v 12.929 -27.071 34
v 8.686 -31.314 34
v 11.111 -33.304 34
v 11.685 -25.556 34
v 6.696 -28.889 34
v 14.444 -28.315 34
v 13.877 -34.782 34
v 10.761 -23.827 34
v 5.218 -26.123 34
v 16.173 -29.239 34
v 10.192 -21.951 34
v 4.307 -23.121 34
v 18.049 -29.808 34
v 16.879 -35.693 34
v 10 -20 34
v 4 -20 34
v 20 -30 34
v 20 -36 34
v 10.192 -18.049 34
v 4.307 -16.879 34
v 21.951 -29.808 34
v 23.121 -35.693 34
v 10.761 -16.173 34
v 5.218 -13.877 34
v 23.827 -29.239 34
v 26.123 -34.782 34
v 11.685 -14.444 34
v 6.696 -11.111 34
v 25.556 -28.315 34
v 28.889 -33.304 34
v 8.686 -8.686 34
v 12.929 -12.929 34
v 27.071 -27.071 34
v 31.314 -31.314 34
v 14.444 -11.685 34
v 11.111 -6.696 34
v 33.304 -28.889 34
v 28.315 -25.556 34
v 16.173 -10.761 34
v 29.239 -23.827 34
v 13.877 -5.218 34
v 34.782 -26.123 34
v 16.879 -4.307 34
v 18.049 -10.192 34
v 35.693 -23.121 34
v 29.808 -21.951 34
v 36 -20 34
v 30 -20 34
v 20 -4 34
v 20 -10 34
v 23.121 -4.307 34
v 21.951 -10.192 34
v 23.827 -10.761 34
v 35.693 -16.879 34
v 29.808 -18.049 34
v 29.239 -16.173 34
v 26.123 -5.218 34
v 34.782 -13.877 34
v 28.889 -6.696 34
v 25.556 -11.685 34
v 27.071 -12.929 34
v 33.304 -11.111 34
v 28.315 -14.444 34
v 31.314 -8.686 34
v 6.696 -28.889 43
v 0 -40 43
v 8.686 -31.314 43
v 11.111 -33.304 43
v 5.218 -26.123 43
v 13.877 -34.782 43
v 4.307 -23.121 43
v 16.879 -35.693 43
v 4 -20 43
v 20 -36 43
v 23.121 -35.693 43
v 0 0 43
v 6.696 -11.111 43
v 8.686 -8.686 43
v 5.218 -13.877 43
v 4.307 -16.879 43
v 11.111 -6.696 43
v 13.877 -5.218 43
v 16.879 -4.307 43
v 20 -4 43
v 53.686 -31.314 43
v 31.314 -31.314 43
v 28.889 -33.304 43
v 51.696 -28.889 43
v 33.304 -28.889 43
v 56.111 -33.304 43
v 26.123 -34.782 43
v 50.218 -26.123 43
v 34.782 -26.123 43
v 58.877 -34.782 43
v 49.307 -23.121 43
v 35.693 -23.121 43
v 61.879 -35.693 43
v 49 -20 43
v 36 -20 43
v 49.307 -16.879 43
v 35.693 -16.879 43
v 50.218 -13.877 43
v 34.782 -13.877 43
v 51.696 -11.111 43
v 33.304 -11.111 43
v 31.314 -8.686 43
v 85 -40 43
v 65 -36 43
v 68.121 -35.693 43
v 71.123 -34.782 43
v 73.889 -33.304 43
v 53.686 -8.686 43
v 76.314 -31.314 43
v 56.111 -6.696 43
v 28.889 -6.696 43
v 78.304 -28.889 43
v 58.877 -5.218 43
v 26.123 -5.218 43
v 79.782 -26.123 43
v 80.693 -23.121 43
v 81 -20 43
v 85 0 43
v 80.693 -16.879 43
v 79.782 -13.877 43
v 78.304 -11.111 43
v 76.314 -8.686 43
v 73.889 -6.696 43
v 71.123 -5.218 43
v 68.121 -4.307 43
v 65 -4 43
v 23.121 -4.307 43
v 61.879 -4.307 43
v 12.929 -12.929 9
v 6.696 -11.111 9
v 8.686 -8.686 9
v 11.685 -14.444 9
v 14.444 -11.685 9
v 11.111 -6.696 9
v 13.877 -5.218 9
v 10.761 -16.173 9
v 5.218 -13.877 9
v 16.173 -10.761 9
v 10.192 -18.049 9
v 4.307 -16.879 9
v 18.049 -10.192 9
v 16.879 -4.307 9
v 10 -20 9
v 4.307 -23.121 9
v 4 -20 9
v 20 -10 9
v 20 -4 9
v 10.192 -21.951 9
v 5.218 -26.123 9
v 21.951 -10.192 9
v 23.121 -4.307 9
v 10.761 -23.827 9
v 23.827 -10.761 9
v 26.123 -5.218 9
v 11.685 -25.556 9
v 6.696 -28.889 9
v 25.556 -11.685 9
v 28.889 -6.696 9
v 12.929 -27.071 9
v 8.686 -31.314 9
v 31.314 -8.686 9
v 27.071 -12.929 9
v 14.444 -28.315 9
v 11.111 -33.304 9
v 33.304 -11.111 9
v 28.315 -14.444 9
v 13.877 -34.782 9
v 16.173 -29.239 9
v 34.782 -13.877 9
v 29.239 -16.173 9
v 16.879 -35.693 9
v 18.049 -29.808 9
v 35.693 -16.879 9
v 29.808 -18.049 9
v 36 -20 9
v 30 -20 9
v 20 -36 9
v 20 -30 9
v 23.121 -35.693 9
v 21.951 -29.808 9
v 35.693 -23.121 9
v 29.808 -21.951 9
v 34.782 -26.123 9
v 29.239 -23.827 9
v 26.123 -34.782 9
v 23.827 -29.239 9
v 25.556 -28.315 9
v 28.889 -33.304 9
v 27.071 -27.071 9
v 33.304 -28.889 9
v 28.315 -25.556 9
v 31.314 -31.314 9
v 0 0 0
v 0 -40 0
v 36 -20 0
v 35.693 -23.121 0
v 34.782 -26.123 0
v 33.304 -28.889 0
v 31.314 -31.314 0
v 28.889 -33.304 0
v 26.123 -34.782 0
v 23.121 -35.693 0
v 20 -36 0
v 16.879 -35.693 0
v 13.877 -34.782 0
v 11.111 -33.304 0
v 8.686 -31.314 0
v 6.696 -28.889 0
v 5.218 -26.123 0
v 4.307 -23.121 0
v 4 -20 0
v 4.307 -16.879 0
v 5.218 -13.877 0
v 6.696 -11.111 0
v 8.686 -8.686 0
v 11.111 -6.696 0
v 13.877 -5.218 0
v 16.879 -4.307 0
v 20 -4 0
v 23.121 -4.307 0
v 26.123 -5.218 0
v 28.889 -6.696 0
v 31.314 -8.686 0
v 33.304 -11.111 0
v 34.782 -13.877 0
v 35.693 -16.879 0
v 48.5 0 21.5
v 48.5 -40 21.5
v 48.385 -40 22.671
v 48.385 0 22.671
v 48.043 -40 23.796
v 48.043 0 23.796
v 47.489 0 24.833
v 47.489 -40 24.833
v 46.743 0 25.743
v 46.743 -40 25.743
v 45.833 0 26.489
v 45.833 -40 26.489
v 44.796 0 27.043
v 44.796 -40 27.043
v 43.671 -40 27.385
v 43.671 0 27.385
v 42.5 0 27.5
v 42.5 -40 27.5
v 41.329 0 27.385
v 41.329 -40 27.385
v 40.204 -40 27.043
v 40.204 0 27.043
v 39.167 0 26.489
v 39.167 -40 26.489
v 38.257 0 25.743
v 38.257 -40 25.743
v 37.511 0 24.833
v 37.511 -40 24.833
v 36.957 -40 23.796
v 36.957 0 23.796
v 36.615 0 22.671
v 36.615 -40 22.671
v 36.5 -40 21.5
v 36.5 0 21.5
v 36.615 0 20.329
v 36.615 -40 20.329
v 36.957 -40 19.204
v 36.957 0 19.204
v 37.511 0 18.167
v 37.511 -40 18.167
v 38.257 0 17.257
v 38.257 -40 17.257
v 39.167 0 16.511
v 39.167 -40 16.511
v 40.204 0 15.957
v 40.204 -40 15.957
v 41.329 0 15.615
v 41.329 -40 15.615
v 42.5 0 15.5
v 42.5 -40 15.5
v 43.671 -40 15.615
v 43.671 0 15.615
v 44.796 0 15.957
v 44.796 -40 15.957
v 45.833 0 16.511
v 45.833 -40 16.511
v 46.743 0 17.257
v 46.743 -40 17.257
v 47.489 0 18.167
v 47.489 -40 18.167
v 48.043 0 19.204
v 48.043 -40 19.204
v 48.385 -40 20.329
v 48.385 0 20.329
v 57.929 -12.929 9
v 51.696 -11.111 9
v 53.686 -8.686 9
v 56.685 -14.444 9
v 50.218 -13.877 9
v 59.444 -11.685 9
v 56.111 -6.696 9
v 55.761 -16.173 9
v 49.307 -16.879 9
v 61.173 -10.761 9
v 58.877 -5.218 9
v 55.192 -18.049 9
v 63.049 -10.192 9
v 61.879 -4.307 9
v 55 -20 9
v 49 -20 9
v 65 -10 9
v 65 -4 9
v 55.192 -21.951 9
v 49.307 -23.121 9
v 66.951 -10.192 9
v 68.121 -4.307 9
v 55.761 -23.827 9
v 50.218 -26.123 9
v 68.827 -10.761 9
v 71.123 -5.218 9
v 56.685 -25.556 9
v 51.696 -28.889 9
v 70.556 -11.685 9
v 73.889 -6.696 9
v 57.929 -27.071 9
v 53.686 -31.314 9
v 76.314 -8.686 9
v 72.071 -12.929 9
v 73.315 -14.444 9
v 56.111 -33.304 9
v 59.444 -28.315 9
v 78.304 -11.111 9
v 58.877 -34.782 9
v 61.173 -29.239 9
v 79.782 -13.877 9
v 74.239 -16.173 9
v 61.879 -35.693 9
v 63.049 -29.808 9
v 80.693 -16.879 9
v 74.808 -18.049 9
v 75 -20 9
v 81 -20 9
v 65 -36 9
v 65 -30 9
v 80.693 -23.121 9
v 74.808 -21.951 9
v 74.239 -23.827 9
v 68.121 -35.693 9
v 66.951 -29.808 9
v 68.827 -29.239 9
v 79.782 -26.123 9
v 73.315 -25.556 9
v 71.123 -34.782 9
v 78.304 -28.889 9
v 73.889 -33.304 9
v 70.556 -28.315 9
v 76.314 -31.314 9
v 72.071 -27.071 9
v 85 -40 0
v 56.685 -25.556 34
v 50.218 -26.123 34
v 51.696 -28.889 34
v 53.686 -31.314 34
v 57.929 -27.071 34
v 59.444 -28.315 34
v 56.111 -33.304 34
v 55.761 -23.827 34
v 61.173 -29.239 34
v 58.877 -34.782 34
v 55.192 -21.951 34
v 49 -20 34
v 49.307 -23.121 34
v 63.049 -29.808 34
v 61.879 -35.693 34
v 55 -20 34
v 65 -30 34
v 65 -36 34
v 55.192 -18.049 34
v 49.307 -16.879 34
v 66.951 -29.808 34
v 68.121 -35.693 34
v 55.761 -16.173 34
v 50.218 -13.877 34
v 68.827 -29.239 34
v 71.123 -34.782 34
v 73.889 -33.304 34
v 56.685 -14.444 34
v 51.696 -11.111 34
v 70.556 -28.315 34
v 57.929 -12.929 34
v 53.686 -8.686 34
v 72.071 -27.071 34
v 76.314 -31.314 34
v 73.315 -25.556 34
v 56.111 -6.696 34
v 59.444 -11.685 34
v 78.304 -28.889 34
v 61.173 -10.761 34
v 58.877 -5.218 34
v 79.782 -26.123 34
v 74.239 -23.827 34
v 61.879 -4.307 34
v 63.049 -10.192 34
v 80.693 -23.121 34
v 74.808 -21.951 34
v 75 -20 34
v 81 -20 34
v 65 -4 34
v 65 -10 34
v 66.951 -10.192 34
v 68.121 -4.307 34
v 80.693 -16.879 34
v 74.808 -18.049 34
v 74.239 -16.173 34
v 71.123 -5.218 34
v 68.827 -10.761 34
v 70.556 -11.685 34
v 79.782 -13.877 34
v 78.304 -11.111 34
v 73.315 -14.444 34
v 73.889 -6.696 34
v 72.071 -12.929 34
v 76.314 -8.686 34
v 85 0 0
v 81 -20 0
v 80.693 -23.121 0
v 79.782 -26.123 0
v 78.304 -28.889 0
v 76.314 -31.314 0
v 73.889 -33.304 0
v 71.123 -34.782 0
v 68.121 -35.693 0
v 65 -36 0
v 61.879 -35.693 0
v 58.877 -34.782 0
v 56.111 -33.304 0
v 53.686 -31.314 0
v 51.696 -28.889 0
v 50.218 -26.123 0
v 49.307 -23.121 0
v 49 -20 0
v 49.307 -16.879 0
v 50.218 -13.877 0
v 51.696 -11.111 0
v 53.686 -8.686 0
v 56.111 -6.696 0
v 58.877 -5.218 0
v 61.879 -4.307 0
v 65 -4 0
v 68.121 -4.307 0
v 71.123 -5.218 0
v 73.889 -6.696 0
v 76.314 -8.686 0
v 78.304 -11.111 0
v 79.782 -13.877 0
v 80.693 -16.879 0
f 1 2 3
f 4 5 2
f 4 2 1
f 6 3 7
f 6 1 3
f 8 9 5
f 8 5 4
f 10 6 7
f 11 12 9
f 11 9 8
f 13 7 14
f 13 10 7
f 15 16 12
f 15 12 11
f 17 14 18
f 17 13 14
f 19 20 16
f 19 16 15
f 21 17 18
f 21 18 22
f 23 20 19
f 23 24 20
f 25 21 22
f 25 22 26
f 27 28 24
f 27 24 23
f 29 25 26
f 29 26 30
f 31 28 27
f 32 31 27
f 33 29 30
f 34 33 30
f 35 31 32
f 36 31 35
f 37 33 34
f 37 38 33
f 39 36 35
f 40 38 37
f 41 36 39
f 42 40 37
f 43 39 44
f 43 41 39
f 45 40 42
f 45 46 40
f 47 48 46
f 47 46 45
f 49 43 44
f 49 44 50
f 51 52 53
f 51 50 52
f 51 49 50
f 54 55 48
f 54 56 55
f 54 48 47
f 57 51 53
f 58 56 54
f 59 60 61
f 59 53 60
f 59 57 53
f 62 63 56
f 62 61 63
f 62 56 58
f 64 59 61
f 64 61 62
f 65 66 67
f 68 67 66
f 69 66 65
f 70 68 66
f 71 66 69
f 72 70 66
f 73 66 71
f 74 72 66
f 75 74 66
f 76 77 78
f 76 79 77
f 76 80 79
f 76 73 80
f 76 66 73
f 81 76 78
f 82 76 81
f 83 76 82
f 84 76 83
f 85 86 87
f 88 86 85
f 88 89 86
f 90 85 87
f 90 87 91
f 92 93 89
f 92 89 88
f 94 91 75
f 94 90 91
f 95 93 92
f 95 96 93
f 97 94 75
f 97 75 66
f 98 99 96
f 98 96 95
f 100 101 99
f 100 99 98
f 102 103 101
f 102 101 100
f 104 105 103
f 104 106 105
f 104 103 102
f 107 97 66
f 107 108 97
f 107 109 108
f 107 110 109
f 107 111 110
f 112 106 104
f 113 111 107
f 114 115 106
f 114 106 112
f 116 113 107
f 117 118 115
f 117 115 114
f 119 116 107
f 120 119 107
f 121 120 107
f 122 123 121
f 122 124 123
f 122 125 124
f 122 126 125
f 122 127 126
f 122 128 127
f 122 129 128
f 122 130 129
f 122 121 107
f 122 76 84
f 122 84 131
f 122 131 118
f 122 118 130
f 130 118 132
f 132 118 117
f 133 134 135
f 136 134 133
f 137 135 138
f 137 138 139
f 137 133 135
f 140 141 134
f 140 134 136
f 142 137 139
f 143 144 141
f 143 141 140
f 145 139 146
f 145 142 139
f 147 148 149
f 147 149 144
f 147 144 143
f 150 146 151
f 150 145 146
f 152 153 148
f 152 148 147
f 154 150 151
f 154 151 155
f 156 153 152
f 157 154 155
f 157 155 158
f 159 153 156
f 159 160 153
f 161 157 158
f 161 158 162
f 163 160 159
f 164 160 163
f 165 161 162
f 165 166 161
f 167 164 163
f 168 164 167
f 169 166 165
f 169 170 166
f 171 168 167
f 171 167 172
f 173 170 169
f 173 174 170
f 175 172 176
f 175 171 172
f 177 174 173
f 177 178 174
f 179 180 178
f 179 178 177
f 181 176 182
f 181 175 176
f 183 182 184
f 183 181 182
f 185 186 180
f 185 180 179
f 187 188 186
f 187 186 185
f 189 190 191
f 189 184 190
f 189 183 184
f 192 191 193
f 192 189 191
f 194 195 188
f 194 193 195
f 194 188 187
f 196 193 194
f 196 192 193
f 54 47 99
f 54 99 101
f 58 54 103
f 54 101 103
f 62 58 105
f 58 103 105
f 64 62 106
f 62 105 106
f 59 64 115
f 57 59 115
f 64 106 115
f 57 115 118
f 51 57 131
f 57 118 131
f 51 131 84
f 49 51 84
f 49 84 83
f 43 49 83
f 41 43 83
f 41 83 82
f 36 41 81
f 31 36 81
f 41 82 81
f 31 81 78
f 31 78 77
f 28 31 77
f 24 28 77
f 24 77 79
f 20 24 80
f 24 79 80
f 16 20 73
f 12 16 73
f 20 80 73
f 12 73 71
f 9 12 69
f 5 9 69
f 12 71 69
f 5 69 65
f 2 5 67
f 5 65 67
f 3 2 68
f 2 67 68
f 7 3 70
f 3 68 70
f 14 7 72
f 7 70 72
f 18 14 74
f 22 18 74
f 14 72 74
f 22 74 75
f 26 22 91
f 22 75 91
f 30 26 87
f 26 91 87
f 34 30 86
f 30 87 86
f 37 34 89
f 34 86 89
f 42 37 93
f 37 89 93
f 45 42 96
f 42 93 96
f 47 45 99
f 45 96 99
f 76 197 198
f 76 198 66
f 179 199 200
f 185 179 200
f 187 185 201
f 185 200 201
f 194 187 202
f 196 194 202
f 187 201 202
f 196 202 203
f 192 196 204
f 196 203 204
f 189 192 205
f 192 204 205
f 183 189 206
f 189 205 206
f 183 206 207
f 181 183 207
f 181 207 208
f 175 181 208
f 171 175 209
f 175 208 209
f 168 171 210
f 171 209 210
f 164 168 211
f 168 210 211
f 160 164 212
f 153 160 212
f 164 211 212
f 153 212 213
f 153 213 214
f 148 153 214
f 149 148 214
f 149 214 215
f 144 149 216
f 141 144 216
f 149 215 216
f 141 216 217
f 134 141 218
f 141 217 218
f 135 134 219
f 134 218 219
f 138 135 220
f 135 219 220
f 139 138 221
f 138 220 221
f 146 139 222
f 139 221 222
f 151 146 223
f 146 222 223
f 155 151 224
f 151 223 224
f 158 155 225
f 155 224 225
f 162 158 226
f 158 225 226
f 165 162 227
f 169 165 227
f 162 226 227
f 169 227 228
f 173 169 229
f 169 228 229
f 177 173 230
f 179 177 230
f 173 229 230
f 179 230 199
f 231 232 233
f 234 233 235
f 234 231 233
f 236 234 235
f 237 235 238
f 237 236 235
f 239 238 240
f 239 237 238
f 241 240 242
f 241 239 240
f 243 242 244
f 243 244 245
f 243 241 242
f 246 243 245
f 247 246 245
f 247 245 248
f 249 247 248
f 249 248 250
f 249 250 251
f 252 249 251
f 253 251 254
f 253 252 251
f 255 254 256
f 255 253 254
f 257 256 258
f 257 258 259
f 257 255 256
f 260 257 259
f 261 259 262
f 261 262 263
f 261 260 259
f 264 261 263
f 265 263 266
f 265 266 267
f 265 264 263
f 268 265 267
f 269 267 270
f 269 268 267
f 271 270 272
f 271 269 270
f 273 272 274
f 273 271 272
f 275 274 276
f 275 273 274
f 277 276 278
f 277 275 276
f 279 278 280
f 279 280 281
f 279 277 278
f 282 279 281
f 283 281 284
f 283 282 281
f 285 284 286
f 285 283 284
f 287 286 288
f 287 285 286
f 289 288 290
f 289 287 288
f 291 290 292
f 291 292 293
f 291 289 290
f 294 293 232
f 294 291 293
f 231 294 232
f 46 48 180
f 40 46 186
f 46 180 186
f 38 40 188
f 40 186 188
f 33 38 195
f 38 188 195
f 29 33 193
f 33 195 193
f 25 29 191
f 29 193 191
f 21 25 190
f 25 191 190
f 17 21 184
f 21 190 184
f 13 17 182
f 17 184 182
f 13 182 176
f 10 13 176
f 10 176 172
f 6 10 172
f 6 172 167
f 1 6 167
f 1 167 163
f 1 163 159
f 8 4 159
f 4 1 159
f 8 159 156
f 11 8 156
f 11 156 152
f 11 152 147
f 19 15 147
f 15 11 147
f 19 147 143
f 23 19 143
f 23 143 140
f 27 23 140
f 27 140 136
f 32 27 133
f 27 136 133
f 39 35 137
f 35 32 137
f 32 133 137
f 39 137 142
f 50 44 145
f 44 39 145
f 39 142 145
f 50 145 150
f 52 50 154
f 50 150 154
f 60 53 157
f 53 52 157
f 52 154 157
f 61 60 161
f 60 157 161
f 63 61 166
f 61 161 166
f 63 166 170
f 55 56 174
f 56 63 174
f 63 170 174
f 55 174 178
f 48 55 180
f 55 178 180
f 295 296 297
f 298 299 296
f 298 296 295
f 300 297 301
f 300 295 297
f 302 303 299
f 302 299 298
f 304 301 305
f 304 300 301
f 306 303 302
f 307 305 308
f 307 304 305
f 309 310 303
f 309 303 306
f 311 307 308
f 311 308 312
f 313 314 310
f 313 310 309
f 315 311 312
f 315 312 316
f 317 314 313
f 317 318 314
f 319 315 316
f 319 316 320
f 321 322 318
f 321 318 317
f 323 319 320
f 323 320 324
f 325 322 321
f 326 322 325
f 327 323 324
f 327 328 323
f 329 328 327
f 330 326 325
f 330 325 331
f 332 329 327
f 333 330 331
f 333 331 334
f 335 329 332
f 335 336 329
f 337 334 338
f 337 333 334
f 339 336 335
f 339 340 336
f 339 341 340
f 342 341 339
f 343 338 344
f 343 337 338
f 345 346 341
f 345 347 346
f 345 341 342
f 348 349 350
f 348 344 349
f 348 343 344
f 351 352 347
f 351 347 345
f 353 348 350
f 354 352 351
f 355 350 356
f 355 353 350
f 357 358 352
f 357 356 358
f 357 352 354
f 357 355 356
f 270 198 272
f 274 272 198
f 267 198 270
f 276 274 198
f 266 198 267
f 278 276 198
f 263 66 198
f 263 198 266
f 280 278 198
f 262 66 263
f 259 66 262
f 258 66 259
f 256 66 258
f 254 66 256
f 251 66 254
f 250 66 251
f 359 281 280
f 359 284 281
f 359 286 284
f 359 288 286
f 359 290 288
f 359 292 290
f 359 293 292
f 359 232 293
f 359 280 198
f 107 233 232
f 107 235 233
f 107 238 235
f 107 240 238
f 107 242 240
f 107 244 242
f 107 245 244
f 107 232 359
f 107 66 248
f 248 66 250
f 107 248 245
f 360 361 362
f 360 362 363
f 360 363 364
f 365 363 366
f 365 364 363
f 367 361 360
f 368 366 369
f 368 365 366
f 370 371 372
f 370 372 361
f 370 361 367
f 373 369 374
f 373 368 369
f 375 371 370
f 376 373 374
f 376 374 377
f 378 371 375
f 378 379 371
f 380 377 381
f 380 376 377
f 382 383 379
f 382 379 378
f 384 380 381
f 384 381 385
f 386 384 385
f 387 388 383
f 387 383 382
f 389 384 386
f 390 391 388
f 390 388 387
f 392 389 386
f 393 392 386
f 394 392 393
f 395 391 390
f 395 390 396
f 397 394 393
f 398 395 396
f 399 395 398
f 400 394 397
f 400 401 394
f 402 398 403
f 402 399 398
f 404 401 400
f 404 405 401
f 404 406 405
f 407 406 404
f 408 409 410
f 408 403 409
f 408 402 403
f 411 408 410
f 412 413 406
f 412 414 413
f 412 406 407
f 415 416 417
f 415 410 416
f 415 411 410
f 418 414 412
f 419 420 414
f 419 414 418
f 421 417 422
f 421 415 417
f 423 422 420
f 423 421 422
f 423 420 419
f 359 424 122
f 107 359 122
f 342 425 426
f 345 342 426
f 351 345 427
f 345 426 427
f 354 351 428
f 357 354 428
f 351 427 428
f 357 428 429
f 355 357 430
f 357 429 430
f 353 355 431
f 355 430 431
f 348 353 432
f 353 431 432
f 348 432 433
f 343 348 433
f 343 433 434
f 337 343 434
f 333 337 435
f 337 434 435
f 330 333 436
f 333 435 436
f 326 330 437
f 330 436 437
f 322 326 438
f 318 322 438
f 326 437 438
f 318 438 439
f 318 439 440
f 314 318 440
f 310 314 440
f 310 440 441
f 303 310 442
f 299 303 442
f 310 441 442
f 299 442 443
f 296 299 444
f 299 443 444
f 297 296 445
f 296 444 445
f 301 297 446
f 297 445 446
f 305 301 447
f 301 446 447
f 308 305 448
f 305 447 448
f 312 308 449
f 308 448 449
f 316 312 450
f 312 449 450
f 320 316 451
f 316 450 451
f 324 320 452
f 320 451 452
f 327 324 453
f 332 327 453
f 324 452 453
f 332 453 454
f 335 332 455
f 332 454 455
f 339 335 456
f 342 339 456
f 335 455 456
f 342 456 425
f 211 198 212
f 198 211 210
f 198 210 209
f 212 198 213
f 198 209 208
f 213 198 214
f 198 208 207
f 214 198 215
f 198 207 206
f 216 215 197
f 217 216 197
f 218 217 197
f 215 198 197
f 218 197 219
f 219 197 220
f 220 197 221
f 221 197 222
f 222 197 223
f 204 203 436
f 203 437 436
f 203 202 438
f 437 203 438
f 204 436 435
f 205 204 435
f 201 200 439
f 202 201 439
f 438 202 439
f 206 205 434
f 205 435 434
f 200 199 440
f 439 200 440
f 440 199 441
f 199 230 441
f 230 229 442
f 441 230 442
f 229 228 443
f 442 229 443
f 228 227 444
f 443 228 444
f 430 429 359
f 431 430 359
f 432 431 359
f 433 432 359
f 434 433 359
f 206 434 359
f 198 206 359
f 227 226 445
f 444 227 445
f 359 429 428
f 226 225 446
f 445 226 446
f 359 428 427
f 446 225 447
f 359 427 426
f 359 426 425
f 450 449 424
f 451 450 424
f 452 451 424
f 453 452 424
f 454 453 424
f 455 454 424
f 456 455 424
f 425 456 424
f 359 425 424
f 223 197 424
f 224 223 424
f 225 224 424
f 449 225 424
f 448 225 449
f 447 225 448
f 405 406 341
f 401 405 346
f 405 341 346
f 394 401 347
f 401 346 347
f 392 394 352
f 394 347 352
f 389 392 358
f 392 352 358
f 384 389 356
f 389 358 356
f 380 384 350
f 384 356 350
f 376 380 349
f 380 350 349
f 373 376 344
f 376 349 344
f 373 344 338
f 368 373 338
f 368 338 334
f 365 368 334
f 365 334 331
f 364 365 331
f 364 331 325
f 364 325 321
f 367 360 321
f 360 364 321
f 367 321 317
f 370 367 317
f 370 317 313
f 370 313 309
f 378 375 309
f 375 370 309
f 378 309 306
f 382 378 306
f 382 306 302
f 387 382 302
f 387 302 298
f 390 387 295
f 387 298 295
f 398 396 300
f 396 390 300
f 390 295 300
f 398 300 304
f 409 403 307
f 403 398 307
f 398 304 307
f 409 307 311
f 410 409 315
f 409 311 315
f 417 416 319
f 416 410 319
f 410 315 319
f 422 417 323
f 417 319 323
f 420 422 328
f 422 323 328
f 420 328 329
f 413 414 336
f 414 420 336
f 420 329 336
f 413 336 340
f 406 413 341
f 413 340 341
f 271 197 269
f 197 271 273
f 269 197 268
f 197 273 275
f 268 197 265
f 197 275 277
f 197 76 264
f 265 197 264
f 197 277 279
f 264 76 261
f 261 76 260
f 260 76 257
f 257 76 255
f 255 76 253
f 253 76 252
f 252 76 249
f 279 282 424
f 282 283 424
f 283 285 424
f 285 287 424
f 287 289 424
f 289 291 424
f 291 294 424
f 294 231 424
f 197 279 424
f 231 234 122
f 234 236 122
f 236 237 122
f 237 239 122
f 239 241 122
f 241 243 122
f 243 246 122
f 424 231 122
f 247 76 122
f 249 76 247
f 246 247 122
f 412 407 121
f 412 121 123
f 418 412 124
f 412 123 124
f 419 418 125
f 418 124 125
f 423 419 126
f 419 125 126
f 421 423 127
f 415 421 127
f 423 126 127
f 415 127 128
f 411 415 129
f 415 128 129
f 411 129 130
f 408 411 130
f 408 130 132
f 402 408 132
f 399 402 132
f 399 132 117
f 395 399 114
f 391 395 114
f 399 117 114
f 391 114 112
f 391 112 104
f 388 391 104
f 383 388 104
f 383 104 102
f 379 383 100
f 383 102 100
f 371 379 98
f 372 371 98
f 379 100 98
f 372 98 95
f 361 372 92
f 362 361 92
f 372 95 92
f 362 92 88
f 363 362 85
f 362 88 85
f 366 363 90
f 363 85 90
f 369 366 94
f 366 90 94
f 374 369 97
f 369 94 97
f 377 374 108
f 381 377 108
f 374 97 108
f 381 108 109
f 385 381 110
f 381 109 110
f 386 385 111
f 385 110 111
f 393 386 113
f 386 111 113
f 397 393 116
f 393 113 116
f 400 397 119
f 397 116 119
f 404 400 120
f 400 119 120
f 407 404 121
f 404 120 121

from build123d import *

# Parameters (mm, degrees)
F0_W     = 85
F0_H     = 43
F0_R     = 6
F1_DEPTH = 40
F2_R     = 10
F3_DEPTH = 43.001
F4_R     = 16
F4_R_2   = 10
F5_DEPTH = 9
F6_R     = 16
F6_R_2   = 10
F7_DEPTH = 9


with BuildPart() as f1:
    # F0 (on Front) → F1 (new body)
    with BuildSketch(Plane.XZ):
        with Locations((42.5, 21.5)):
            Rectangle(F0_W, F0_H)
        with Locations((42.5, 21.5)):
            Circle(F0_R, mode=Mode.SUBTRACT)
    extrude(amount=F1_DEPTH)

    # F2 (on face) → F3 (cut, through all)
    with BuildSketch(Plane(origin=(0, 0, 0), x_dir=(1, 0, 0), z_dir=(0, 0, -1))):
        with Locations((20, 20)):
            Circle(F2_R)
        with Locations((65, 20)):
            Circle(F2_R)
    extrude(amount=-F3_DEPTH, mode=Mode.SUBTRACT)

    # F4 (on face) → F5 (cut)
    with BuildSketch(Plane(origin=(0, 0, 0), x_dir=(1, 0, 0), z_dir=(0, 0, -1))):
        with Locations((20, 20)):
            Circle(F4_R)
        with Locations((20, 20)):
            Circle(F4_R_2, mode=Mode.SUBTRACT)
        with Locations((65, 20)):
            Circle(F4_R)
        with Locations((65, 20)):
            Circle(F4_R_2, mode=Mode.SUBTRACT)
    extrude(amount=-F5_DEPTH, mode=Mode.SUBTRACT)

    # F6 (on face) → F7 (cut)
    with BuildSketch(Plane.XY.offset(43)):
        with Locations((20, -20)):
            Circle(F6_R)
        with Locations((20, -20)):
            Circle(F6_R_2, mode=Mode.SUBTRACT)
        with Locations((65, -20)):
            Circle(F6_R)
        with Locations((65, -20)):
            Circle(F6_R_2, mode=Mode.SUBTRACT)
    extrude(amount=-F7_DEPTH, mode=Mode.SUBTRACT)


solid = f1.part
